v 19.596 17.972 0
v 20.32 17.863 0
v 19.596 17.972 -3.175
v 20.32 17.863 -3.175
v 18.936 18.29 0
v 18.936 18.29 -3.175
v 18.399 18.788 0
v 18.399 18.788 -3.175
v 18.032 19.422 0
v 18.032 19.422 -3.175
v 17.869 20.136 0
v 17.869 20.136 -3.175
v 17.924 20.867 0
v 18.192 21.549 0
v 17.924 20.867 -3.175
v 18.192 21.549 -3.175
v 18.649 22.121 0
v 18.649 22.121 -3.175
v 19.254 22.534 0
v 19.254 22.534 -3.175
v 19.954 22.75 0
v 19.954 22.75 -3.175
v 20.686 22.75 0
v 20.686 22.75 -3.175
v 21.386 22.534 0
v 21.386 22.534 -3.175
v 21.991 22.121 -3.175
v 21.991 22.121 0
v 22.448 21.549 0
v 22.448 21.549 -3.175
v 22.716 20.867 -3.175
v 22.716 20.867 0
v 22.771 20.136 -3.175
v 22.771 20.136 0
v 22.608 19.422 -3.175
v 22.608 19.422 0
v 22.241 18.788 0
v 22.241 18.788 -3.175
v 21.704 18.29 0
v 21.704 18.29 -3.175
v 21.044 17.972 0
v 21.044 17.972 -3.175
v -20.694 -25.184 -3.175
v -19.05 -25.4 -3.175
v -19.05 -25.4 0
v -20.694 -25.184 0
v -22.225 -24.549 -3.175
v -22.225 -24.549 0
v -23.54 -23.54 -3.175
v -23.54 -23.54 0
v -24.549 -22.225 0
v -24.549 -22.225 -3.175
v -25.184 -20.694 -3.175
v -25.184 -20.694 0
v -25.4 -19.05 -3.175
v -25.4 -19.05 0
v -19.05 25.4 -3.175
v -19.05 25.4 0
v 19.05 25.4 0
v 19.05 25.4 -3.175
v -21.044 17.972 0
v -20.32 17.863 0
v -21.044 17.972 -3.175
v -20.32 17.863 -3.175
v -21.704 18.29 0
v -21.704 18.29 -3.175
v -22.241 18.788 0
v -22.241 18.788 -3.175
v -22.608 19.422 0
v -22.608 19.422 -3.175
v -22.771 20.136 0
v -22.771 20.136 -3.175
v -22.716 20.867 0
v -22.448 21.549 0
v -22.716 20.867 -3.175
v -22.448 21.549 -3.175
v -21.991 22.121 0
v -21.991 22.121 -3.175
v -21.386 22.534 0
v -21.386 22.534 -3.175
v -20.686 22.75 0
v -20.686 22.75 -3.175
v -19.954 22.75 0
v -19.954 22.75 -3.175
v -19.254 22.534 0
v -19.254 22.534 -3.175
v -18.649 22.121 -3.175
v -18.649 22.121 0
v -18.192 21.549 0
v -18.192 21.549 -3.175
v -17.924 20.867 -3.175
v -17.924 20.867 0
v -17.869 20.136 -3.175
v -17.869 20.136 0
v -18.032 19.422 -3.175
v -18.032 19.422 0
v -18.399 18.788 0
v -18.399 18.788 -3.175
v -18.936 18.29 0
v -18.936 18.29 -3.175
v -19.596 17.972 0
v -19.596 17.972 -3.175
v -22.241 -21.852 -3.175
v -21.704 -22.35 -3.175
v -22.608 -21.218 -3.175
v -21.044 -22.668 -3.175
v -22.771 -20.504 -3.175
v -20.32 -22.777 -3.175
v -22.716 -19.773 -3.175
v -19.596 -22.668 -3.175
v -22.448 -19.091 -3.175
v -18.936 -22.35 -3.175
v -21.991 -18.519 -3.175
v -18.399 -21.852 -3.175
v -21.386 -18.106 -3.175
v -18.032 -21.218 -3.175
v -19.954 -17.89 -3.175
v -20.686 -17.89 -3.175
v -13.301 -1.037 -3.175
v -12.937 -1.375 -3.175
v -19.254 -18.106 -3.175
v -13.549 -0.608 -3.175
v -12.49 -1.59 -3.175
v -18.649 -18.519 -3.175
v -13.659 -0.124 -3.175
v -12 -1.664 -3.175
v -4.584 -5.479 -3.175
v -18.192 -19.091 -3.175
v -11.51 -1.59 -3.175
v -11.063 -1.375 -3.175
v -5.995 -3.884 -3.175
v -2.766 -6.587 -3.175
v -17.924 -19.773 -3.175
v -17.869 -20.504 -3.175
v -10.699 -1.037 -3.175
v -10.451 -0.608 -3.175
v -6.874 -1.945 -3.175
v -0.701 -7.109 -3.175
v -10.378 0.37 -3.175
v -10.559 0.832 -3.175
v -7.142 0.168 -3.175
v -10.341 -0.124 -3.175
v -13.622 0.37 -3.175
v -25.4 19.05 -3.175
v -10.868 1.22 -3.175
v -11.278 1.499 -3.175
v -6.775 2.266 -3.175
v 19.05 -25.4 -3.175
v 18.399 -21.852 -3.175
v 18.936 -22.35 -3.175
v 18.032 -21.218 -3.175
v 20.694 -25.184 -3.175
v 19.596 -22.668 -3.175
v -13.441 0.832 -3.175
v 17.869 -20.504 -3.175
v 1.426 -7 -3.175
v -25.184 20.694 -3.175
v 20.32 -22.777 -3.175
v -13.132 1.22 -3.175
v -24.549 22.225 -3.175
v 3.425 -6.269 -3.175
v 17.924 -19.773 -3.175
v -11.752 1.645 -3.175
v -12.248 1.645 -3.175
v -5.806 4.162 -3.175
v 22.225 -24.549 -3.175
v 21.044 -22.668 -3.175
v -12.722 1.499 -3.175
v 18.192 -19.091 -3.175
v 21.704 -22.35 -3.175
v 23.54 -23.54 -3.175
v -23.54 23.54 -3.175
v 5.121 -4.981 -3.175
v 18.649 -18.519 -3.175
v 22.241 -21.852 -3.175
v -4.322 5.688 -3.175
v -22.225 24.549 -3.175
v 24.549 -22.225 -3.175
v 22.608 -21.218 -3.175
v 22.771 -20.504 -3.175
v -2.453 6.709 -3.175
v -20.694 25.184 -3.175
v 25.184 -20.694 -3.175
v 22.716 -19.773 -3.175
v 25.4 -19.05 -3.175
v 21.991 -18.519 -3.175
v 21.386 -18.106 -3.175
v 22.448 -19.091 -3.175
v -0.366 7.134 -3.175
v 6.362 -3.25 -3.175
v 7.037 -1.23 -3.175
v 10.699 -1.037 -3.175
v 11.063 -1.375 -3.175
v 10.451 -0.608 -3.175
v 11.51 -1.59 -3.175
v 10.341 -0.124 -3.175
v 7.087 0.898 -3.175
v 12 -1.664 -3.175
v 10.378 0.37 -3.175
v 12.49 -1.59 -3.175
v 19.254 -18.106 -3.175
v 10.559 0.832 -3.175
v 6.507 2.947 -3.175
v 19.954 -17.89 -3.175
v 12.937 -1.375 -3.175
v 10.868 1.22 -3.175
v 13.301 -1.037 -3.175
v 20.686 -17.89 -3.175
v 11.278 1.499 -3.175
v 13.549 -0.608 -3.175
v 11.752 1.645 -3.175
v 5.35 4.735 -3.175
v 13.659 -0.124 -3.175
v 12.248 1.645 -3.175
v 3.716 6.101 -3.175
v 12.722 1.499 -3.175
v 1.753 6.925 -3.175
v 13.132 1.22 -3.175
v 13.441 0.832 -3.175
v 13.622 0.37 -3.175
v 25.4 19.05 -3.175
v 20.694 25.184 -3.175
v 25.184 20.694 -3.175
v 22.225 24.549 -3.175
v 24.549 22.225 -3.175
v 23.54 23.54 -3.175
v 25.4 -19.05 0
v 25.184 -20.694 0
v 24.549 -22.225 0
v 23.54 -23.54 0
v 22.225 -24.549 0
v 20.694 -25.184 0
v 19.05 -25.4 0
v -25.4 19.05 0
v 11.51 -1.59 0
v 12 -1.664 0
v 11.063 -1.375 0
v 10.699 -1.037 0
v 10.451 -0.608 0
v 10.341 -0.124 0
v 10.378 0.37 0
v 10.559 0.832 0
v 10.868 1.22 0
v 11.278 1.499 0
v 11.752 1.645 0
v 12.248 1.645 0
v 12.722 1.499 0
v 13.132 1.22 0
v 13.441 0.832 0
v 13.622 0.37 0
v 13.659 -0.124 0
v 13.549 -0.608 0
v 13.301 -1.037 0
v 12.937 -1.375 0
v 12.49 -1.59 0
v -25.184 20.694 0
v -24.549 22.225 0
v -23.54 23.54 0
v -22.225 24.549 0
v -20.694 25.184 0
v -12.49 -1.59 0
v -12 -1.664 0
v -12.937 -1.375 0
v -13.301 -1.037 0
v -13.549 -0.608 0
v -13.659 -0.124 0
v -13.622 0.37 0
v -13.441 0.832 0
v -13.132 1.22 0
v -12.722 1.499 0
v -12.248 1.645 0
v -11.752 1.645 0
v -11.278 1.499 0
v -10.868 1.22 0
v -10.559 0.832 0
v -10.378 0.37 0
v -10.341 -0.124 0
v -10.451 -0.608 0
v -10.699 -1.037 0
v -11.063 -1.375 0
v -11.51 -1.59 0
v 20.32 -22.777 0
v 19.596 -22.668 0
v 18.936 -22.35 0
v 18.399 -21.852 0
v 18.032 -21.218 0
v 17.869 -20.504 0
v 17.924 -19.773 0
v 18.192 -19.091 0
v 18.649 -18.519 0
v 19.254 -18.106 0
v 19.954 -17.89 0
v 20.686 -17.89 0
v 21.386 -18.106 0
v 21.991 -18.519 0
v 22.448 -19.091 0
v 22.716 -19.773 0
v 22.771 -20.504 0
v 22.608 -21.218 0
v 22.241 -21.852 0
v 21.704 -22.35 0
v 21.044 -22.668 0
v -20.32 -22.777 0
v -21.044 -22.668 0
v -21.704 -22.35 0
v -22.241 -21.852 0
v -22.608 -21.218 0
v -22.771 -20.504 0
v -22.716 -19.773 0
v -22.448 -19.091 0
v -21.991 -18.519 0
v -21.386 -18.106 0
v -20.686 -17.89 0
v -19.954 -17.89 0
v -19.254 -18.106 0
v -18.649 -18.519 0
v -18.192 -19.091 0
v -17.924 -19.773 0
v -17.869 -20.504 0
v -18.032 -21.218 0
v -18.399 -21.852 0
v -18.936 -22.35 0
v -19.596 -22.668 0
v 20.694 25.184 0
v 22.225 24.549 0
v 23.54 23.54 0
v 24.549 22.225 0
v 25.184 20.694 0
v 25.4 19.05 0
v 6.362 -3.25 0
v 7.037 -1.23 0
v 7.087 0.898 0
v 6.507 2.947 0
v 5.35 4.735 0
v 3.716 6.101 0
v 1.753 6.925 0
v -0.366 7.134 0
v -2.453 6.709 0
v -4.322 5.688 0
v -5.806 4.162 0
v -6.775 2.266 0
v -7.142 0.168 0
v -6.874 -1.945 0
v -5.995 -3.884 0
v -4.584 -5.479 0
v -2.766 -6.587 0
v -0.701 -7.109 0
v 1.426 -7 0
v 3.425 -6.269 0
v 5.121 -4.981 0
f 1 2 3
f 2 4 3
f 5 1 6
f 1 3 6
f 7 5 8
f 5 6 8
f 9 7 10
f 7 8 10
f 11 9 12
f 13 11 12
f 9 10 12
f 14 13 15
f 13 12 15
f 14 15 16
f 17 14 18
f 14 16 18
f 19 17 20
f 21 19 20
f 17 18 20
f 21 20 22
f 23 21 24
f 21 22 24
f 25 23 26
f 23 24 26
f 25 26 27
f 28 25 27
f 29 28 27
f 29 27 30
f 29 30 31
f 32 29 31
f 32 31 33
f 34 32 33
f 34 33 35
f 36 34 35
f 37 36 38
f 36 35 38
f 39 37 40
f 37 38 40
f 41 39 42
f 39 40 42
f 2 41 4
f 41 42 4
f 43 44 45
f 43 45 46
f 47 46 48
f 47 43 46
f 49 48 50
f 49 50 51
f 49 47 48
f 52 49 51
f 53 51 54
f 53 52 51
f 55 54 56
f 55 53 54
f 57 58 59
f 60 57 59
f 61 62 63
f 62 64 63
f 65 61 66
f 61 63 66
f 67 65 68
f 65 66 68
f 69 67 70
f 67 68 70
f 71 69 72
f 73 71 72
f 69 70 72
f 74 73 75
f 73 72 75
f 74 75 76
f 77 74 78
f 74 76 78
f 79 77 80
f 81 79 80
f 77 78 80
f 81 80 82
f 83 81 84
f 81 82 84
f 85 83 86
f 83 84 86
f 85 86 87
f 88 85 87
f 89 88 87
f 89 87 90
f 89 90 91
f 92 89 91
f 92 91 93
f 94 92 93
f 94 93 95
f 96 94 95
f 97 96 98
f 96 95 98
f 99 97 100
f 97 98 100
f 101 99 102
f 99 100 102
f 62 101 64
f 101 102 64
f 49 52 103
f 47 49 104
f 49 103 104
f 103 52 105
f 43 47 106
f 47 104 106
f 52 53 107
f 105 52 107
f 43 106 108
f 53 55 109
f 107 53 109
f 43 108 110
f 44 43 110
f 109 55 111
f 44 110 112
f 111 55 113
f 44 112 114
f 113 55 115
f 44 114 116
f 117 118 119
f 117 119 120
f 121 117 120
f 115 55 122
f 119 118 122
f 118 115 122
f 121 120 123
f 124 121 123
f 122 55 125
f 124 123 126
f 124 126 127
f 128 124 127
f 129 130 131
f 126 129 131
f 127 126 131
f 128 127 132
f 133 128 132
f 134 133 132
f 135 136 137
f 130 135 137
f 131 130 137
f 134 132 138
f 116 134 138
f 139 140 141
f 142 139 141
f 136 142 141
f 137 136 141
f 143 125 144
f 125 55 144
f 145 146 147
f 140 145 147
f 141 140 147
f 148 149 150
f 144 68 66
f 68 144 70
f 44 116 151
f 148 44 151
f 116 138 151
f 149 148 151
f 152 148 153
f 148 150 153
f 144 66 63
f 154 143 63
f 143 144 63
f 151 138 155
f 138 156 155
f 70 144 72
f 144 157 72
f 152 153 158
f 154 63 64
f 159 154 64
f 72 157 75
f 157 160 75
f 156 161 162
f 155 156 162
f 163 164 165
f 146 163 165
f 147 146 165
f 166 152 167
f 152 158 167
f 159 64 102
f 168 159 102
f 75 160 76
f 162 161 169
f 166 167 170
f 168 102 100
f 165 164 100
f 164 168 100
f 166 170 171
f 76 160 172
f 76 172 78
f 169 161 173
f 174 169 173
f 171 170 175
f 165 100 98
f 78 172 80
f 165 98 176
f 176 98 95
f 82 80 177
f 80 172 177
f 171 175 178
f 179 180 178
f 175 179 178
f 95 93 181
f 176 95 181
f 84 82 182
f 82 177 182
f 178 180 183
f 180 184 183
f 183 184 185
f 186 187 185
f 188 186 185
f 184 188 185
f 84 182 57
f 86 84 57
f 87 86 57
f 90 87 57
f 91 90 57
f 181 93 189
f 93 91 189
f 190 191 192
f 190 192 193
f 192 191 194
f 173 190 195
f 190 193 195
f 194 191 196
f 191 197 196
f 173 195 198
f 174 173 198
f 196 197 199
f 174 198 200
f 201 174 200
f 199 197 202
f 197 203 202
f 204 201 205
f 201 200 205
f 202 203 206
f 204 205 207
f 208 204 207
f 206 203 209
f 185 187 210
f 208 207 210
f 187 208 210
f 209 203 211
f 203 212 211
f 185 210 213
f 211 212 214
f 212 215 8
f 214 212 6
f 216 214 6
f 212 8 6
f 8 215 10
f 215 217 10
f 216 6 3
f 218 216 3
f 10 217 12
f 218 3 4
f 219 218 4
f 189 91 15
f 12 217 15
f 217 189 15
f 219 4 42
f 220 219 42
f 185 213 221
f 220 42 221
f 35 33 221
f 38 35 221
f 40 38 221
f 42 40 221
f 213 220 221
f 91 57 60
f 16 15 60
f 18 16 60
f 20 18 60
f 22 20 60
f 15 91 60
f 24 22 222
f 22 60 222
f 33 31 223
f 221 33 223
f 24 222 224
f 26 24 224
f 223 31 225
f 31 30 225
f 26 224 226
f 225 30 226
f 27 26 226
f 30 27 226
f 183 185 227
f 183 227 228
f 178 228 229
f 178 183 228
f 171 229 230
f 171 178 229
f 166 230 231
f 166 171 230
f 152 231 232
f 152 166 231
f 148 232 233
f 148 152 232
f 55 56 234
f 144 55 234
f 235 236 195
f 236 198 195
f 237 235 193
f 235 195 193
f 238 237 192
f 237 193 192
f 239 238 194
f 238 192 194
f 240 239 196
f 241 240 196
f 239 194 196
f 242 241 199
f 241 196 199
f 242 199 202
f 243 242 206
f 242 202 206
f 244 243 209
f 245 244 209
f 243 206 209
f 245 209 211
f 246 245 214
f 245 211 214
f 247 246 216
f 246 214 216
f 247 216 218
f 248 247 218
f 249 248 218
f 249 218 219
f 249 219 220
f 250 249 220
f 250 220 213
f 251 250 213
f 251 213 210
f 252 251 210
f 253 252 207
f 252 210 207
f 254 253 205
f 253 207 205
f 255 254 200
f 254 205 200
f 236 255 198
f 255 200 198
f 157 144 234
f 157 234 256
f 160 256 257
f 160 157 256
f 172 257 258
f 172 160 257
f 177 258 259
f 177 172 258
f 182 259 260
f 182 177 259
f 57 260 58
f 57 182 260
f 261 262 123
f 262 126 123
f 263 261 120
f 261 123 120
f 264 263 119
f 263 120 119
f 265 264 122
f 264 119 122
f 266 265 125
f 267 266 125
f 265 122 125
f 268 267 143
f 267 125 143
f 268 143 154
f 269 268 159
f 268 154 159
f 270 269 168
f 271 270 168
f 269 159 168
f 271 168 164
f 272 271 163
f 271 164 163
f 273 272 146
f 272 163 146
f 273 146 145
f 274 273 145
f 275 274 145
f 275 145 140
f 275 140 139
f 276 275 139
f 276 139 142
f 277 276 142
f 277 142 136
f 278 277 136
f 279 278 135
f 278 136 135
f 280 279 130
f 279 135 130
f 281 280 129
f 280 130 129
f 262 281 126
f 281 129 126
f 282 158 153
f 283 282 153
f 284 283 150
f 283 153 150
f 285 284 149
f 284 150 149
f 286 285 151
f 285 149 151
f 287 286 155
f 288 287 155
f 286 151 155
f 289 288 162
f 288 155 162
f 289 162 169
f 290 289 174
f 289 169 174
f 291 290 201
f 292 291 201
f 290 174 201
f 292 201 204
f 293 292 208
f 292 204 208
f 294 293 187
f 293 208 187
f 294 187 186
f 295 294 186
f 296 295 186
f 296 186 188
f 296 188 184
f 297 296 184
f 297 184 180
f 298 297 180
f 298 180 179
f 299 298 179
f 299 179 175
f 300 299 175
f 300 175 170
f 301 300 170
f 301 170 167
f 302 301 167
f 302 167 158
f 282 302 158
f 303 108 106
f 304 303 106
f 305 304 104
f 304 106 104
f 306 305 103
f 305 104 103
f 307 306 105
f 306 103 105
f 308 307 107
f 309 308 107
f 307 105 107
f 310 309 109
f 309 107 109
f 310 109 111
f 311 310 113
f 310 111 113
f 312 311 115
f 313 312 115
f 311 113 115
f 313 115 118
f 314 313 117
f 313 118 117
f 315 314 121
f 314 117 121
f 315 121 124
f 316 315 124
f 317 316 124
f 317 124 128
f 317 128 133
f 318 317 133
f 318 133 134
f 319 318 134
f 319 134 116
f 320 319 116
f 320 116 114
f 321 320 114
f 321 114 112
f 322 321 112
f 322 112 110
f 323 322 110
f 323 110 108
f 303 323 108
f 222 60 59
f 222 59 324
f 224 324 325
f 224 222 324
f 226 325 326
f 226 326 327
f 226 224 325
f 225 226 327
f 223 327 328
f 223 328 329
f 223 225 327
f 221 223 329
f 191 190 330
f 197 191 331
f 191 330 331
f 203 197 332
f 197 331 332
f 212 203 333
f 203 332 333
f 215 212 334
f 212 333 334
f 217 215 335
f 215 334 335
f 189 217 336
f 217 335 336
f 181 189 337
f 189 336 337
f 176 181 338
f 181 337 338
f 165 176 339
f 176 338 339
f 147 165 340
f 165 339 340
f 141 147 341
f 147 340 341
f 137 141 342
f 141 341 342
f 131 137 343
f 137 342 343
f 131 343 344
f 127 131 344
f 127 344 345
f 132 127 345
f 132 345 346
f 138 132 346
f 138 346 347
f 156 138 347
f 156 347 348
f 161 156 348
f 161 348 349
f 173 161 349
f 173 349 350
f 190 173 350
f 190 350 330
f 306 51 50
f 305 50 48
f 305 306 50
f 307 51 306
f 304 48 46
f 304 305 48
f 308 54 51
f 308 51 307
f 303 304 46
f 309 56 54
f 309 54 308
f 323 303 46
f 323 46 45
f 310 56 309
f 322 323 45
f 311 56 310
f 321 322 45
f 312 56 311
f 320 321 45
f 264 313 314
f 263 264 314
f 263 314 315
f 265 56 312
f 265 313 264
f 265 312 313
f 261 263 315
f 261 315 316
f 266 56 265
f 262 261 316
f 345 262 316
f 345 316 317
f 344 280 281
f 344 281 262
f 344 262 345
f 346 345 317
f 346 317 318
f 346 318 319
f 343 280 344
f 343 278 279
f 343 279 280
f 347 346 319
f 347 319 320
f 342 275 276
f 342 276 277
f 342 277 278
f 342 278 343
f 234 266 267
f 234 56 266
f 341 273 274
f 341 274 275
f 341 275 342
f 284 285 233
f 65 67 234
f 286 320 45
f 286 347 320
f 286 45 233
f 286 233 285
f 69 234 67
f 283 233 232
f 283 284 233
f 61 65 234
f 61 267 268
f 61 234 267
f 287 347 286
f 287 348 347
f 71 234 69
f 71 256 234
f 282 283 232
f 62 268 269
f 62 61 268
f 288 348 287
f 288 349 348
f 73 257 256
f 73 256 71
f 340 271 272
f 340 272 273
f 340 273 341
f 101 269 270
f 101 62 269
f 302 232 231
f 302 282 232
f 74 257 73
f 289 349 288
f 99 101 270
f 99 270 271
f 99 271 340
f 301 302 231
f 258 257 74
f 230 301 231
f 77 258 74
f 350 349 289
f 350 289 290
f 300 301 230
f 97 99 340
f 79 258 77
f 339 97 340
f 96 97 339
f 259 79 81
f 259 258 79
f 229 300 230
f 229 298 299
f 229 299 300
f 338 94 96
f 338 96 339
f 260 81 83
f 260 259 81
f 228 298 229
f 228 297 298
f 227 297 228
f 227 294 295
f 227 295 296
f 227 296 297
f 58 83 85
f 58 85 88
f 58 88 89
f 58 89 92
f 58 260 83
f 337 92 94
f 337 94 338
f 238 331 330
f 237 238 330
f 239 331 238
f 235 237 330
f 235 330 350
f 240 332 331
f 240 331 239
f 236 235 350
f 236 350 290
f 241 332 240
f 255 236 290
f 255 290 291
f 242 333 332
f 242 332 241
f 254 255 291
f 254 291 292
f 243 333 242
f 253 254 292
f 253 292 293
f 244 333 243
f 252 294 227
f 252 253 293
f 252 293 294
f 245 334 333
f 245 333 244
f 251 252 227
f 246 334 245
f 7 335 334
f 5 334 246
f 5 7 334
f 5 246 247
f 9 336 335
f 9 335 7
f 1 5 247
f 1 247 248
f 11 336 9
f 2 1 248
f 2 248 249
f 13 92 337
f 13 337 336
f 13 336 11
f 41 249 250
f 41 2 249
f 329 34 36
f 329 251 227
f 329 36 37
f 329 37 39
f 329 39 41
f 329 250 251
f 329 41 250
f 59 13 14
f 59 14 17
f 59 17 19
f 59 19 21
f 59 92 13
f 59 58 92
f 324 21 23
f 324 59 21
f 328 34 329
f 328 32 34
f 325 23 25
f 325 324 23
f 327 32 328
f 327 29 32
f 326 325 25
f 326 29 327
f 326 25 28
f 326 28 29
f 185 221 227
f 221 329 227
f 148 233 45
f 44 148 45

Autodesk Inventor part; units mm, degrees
ref_plane "YZ Plane" through (0, 0, 0) normal (1, 0, 0) x (0, 1, 0)
ref_plane "XZ Plane" through (0, 0, 0) normal (0, 1, 0) x (-1, 0, 0)
ref_plane "XY Plane" through (0, 0, 0) normal (0, 0, 1) x (1, 0, 0)
sketch "Sketch1" plane through (0, 0, 0) normal (0, 0, 1) x (1, 0, 0)
  line L0 (-13, 12) -> (13, 12)
  line L1 (13, 12) -> (13, -12)
  line L2 (13, -12) -> (-13, -12)
  line L3 (-13, -12) -> (-13, 12)
  line L4 (-13, 3.25) -> (-15, 3.25)
  line L5 (-15, 3.25) -> (-15, -3.25)
  line L6 (-15, -3.25) -> (-13, -3.25)
  line L7 (-13, -3.25) -> (-13, 3.25)
  line L8 (13, 3.25) -> (15, 3.25)
  line L9 (15, 3.25) -> (15, -3.25)
  line L10 (15, -3.25) -> (13, -3.25)
  line L11 (13, -3.25) -> (13, 3.25)
  line L12 (-25.4, 25.4) -> (25.4, 25.4)
  line L13 (25.4, 25.4) -> (25.4, -25.4)
  line L14 (25.4, -25.4) -> (-25.4, -25.4)
  line L15 (-25.4, -25.4) -> (-25.4, 25.4)
  arc A0 (6.3617, 3.25) -> (-6.3617, 3.25) centre (0, 0) ccw
  circle A1 centre (-3, 12) radius 1.5
  line L16 (-13, 8) -> (-9, 12)
  line L17 (9, 12) -> (13, 8)
  line L18 (13, -8) -> (9, -12)
  line L19 (-13, -8) -> (-9, -12)
  line L20 (-14, 3.25) -> (14, 3.25)
  line L21 (-14, -3.25) -> (-6.3617, -3.25)
  arc A2 (6.3617, -3.25) -> (6.3617, 3.25) centre (0, 0) ccw
  arc A3 (-6.3617, 3.25) -> (-6.3617, -3.25) centre (0, 0) ccw
  arc A4 (-6.3617, -3.25) -> (6.3617, -3.25) centre (0, 0) ccw
  line L22 (-6.3617, -3.25) -> (14, -3.25)
  line L23 (-15, 3.25) -> (15, 3.25)
  line L24 (15, 3.25) -> (15, -3.25)
  line L25 (15, -3.25) -> (-15, -3.25)
  line L26 (-15, -3.25) -> (-15, 3.25)
  point P0 (-20.32, 20.32)
  point P1 (20.32, 20.32)
  point P2 (20.32, -20.32)
  point P3 (-20.32, -20.32)
  point P4 (-12, 0)
  point P5 (12, 0)
  dimension "d0" = 24
  dimension "d1" = 12
  dimension "d2" = 26
  dimension "d3" = 13
  dimension "d4" = 2
  dimension "d5" = 6.5
  dimension "d6" = 3.25
  dimension "d7" = 2
  dimension "d8" = 14.2875
  dimension "d9" = 50.8
  dimension "d10" = 25.4
  dimension "d11" = 50.8
  dimension "d12" = 25.4
  dimension "d13" = 3
  dimension "d14" = 10
  dimension "d15" = 4
  dimension "d16" = 4
  dimension "d17" = 4
  dimension "d18" = 4
  dimension "d19" = 4
  dimension "d20" = 5.08
  dimension "d21" = 5.08
  dimension "d22" = 5.08
  dimension "d23" = 5.08
  dimension "d34" = 40.64
  dimension "d35" = 40.64
  dimension "d61" = 12
  dimension "d62" = 12
extrude "Extrusion1" add sketch "Sketch1" against normal blind 3.175 contours L0 L16 L3 | L0 A1 L17 L1 L20 A0 L3 L16 | A1 L0 | L0 A1 | L20 A3 L21 L3 | L3 L6 L5 L4 | L21 A4 L22 L1 L18 L2 L19 L3 | A0 L20 | L20 A2 L22 A3 | L0 L1 L17 | L19 L2 L3 | L22 A4 | L20 L1 L22 A2 | L8 L9 L10 L1 | L18 L1 L2 | L12 L13 L14 L15
fillet "Fillet2" radius 6.35 4 edges at (25.4, 25.4, -1.5875) (25.4, -25.4, -1.5875) (-25.4, 25.4, -1.5875) (-25.4, -25.4, -1.5875)
hole "Hole2" at (-20.32, 20.32, 0) at (20.32, 20.32, 0) at (20.32, -20.32, 0) at (-20.32, -20.32, 0) direction (0, 0, -1) diameter 4.9149 end through all
extrude "Extrusion6" cut sketch "Sketch1" against normal through all contours A0 L20 | L20 A2 L22 A3 | L22 A4
hole "Hole3" at (-12, 0, 0) at (12, 0, 0) direction (0, 0, -1) diameter 3.3274 end through all
equation "\"d1\" = 0.5 * d0"
equation "\"d3\" = 0.5 * d2"
equation "\"d6\" = 0.5 * d5"
equation "\"d7\" = d4"
equation "\"d10\" = 0.5 * d9"
equation "\"d12\" = 0.5 * d11"
equation "\"d16\" = d15"
equation "\"d17\" = d15"
equation "\"d18\" = d15"
equation "\"d19\" = d15"
equation "\"d22\" = d21"
equation "\"d23\" = d21"
equation "\"d62\" = d61"
properties part number "BD gearbox mount top plate"
